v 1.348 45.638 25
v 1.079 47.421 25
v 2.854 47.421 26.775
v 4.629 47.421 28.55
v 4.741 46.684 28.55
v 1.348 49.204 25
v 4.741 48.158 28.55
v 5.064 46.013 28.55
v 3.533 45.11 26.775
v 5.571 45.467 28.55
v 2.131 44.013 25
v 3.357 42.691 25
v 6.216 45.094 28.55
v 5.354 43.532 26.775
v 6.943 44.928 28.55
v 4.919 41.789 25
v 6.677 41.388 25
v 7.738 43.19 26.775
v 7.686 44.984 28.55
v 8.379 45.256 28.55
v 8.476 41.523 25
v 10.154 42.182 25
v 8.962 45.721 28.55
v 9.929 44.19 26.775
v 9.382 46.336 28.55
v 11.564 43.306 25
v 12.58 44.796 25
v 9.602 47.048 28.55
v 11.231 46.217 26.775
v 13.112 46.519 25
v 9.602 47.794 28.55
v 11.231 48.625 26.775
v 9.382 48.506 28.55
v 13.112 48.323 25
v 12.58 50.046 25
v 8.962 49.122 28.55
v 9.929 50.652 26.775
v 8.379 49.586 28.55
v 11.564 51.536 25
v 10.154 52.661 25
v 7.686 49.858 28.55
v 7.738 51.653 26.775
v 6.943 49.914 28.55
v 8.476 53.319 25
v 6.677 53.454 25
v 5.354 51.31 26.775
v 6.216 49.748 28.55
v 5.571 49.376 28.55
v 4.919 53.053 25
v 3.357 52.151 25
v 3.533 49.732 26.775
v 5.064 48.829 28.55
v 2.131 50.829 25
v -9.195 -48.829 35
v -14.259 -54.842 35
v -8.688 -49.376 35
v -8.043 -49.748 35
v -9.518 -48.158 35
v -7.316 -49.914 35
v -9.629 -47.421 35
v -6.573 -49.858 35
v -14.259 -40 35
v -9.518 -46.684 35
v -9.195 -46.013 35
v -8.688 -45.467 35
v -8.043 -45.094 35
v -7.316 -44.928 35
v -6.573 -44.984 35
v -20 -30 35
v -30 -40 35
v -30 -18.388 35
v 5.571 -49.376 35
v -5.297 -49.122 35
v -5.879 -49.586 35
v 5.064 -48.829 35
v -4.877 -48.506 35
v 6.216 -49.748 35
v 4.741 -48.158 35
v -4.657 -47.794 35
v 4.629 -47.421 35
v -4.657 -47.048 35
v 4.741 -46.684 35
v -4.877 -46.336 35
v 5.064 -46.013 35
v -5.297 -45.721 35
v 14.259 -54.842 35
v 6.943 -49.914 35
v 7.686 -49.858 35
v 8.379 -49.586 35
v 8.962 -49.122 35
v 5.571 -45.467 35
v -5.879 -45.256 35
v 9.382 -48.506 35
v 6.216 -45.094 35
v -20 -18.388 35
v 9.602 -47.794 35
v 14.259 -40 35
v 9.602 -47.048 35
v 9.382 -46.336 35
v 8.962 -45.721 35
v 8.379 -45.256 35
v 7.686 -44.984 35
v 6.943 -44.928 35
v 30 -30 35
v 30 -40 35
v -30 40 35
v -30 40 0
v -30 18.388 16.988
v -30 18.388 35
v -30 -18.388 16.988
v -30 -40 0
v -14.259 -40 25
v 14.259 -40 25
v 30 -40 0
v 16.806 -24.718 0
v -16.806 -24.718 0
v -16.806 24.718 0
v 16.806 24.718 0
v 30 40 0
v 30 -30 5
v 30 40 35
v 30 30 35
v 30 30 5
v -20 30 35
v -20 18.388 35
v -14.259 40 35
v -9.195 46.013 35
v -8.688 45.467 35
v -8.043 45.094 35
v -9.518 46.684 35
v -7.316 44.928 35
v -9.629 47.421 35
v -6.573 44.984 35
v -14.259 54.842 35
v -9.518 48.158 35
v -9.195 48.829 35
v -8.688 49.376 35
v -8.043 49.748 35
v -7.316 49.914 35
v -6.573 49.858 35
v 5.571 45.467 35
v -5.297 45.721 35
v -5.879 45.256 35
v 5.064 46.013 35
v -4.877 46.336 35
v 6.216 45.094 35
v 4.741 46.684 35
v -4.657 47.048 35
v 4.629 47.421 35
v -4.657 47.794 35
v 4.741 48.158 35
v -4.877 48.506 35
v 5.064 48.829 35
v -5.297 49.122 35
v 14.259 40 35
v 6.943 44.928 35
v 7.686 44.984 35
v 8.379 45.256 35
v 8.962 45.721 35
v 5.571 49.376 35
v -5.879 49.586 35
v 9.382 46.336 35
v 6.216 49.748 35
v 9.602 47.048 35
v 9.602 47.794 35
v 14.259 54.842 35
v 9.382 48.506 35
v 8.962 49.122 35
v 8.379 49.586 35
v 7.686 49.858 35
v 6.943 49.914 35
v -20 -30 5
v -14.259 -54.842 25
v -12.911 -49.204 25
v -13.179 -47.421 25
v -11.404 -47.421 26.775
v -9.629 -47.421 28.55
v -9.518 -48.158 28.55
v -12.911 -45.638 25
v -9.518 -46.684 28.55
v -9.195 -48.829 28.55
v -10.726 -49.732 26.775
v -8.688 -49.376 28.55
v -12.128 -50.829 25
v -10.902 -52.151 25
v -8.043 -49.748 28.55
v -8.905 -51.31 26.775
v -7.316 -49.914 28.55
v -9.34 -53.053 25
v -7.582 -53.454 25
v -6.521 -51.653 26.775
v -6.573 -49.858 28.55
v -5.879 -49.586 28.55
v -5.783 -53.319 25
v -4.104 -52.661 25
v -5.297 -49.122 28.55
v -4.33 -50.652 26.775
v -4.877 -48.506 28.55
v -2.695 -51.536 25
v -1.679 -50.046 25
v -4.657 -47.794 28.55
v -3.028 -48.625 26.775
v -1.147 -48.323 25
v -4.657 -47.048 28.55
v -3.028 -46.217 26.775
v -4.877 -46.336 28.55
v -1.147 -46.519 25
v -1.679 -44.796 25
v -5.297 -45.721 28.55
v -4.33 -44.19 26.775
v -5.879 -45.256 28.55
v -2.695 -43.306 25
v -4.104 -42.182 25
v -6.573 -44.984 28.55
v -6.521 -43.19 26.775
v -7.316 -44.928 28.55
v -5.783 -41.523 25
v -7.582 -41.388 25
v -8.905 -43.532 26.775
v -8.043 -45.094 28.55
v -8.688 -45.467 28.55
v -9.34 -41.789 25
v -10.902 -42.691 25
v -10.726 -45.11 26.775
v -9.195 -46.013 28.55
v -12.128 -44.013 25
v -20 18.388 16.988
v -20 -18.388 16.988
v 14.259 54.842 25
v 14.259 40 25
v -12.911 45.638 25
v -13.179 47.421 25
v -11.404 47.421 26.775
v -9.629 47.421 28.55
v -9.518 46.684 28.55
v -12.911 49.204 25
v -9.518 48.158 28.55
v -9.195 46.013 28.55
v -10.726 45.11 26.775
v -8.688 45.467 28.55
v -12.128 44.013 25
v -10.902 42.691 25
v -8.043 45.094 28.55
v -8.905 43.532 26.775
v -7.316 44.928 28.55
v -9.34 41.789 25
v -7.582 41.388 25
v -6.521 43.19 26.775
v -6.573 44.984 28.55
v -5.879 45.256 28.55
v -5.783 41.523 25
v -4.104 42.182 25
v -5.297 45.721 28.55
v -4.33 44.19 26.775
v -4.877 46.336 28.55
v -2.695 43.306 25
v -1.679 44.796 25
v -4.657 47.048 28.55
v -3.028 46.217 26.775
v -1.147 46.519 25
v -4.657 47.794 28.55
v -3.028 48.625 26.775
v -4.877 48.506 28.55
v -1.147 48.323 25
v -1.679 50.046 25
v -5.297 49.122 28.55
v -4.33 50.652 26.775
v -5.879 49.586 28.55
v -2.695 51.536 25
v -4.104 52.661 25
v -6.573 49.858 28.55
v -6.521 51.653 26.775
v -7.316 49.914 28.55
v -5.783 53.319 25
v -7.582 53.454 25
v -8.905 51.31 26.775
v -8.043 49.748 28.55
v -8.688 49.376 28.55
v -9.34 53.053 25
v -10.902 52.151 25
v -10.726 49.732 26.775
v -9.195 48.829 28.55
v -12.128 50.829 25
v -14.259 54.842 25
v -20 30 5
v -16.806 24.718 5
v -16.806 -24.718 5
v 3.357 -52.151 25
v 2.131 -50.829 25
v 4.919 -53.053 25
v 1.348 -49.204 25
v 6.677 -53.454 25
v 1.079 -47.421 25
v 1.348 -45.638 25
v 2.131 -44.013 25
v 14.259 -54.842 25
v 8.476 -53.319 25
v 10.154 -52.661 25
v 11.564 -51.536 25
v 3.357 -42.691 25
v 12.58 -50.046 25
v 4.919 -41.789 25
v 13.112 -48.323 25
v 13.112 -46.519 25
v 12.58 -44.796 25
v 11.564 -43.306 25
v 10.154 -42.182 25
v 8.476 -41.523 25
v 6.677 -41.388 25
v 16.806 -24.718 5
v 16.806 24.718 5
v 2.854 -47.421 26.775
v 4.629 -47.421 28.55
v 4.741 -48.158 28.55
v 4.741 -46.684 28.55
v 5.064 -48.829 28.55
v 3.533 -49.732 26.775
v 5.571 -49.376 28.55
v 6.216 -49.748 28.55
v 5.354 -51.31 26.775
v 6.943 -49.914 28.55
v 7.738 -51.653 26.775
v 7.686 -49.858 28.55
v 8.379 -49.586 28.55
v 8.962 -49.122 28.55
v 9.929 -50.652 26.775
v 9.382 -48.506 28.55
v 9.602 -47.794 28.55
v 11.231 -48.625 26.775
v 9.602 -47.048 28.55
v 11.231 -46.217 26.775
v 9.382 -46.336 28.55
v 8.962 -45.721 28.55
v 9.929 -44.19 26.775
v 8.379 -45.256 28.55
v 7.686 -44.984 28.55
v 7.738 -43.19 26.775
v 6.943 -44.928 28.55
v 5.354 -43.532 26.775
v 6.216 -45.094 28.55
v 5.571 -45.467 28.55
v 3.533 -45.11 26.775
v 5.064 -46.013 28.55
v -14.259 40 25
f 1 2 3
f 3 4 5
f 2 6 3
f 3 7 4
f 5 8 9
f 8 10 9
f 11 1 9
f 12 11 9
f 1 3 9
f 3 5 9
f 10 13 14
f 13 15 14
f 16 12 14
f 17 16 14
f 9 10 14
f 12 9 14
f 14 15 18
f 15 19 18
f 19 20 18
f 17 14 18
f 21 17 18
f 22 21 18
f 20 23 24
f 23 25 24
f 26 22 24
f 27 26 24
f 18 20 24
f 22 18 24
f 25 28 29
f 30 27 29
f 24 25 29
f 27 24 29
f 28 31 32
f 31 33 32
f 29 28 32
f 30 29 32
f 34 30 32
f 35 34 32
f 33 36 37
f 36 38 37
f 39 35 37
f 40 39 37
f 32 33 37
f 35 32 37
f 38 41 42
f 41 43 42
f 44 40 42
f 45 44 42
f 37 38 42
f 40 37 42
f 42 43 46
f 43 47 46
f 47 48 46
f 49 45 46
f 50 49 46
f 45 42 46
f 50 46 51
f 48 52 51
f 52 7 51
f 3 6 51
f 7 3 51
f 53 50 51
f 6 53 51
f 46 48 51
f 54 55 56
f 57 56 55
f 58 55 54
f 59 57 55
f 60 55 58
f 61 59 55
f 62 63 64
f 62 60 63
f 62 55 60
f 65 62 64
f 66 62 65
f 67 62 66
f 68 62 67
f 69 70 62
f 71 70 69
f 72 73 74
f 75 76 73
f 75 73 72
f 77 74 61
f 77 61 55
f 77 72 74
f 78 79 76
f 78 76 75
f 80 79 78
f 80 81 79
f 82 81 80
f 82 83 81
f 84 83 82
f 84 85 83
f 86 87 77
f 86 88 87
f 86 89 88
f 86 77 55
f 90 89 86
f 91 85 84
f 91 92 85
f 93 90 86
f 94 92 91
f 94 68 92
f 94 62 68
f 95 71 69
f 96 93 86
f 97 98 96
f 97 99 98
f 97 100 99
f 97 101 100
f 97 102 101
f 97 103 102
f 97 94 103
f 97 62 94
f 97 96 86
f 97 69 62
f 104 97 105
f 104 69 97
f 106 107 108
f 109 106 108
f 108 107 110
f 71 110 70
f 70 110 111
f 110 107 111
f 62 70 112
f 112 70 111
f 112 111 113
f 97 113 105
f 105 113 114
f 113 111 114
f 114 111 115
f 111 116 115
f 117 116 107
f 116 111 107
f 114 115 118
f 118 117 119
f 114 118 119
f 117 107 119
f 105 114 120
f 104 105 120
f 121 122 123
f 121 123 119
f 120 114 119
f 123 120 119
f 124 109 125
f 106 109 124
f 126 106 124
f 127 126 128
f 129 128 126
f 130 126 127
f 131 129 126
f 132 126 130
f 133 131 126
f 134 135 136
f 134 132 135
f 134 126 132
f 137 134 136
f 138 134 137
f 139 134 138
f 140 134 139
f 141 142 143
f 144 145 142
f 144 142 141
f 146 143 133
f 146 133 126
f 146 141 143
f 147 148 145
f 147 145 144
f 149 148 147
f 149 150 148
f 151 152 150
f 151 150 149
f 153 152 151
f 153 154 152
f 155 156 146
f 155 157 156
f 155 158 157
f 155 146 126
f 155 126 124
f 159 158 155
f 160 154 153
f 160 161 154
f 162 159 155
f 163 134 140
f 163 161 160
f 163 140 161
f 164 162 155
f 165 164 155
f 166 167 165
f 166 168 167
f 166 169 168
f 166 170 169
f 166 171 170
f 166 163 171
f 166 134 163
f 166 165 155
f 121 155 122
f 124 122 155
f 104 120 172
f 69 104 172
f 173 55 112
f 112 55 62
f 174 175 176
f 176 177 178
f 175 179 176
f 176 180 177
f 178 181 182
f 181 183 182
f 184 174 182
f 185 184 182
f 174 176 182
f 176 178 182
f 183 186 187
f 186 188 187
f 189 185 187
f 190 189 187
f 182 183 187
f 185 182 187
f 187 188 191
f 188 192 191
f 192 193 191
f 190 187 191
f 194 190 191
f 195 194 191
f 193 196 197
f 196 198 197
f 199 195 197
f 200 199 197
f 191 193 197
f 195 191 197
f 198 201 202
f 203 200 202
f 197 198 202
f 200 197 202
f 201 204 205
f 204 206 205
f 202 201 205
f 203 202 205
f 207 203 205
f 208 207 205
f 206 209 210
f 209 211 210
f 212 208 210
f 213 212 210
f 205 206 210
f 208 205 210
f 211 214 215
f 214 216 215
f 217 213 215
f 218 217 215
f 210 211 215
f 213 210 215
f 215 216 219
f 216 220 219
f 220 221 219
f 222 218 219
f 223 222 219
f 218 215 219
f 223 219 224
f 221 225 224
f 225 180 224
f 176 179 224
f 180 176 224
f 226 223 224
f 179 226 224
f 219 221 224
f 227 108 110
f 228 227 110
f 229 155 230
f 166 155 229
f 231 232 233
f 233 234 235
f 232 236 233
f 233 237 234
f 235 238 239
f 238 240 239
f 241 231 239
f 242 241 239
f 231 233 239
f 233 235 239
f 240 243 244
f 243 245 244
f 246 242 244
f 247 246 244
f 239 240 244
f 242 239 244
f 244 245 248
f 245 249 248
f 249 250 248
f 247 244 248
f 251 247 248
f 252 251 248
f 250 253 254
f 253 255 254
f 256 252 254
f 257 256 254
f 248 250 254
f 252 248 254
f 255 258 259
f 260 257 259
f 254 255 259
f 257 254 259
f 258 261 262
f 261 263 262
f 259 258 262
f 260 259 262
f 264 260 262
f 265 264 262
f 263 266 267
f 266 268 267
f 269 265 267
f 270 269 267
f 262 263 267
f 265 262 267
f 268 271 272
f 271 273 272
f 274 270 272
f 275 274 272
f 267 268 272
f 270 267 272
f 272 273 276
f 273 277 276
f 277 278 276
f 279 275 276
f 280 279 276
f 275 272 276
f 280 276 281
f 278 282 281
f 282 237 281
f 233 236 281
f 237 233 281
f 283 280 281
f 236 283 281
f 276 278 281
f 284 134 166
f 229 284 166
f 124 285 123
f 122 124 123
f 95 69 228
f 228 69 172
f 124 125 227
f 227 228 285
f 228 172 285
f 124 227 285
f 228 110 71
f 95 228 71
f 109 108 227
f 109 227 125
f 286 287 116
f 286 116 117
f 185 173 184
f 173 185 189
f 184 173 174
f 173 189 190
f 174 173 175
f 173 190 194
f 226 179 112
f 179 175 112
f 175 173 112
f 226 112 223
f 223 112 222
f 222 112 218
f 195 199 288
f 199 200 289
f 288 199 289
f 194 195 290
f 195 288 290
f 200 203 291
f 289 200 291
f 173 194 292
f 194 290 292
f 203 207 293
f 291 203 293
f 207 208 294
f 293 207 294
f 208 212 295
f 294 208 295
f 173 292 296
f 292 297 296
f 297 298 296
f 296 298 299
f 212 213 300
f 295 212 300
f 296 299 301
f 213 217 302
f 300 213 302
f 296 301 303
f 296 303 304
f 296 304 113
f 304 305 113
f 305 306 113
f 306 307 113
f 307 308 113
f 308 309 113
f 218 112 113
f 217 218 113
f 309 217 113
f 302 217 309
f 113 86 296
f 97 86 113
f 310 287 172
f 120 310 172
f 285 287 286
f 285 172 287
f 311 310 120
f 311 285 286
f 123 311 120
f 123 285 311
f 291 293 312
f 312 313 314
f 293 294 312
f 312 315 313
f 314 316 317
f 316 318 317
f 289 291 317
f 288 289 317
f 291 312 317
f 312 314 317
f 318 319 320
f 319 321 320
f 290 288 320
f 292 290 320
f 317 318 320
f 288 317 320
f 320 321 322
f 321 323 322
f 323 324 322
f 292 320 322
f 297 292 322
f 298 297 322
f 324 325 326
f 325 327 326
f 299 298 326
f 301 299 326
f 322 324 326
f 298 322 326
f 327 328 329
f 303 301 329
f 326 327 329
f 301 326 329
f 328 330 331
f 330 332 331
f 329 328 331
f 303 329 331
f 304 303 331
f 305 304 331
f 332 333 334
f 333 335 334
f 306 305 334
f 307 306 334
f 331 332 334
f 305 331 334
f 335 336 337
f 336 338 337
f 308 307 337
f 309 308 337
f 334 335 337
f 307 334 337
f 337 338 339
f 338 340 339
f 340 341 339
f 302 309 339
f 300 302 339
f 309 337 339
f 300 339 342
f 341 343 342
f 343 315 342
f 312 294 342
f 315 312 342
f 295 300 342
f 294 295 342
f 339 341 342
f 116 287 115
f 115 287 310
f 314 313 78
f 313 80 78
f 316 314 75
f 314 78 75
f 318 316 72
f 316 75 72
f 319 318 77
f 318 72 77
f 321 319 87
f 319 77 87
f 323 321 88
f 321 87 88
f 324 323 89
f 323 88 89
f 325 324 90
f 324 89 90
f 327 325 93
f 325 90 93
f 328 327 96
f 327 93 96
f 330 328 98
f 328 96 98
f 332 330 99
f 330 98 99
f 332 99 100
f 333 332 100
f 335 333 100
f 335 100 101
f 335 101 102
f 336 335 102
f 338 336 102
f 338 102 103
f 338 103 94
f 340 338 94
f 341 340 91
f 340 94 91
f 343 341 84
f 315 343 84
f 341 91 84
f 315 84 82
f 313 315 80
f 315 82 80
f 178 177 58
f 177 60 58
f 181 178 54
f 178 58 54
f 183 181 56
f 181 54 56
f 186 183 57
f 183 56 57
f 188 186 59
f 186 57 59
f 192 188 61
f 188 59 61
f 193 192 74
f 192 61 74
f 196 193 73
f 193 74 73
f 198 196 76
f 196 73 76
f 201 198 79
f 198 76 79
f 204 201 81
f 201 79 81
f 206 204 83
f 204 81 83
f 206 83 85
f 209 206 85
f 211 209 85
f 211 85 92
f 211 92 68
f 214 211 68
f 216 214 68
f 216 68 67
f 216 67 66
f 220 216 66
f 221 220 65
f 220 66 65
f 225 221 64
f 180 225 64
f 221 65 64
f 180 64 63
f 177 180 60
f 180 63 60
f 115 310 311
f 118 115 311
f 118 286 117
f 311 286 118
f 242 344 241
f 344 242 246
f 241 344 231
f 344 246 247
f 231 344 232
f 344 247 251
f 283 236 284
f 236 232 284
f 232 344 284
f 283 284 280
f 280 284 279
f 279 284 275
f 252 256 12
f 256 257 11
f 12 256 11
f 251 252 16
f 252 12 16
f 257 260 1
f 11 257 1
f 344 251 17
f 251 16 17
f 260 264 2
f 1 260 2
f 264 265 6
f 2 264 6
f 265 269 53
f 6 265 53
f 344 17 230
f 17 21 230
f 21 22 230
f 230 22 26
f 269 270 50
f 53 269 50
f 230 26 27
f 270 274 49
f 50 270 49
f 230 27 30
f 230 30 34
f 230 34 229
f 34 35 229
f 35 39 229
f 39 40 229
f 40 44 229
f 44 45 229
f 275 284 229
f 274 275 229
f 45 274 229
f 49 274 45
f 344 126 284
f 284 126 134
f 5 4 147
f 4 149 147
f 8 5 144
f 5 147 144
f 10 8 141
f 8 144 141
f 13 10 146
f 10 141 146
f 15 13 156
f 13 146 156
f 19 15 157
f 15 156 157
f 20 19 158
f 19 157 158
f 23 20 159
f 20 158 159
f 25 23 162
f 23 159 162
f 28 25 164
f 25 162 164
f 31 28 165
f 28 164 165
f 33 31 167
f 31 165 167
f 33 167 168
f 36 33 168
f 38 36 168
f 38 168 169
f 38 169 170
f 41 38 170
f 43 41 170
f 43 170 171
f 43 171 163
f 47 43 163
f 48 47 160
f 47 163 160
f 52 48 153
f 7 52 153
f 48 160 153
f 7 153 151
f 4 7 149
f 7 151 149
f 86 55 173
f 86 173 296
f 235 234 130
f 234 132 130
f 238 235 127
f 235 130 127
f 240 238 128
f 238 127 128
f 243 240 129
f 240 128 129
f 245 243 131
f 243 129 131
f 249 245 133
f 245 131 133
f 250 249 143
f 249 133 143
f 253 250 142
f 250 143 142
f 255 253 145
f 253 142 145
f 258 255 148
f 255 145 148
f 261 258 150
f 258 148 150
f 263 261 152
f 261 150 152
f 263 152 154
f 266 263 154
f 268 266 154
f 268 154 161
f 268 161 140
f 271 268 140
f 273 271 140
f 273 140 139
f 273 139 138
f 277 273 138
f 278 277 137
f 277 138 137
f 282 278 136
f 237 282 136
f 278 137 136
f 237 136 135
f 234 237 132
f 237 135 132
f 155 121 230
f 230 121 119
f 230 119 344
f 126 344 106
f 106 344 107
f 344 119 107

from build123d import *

# Parameters (mm, degrees)
F1_DEPTH       = 35
F2_DEPTH       = 5
F3_W           = 33.611692
F3_H           = 49.436976
F4_DEPTH       = 25
F5_W           = 28.51793
F5_H           = 14.842174
F6_DEPTH       = 10
F9_D           = 5
F9_CSINK_D     = 12.1
F9_CSINK_ANGLE = 90
F10_W          = 36.775354
F10_H          = 36.023068
F11_DEPTH      = 25


with BuildPart() as f1:
    # F0 (on Top) → F1 (new body)
    with BuildSketch(Plane.XY):
        Polygon((-20, 30), (20, 30), (30, 30), (30, 40), (-30, 40), (-30, -40), (30, -40), (30, -30), (20, -30), (-20, -30), align=None)
    extrude(amount=F1_DEPTH)

    # F0 (on Top) → F2 (join)
    with BuildSketch(Plane.XY):
        Polygon((30, 30), (20, 30), (-20, 30), (-20, -30), (20, -30), (30, -30), align=None)
    extrude(amount=F2_DEPTH)

    # F3 (on face) → F4 (cut)
    with BuildSketch(Plane.XY.offset(5)):
        Rectangle(F3_W, F3_H)
    extrude(amount=-F4_DEPTH, mode=Mode.SUBTRACT)

    # F5 (on face) → F6 (join)
    with BuildSketch(Plane.XY.offset(35)):
        with Locations((0, -47.421087)):
            Rectangle(F5_W, F5_H)
        with Locations((0, 47.421087)):
            Rectangle(F5_W, F5_H)
    extrude(amount=-F6_DEPTH)

    # F9 (through all)
    with Locations(Plane(origin=(0, 0, 25), x_dir=(1, 0, 0), z_dir=(0, 0, -1))):
        with Locations((7.129482, 47.421087), (-7.129482, 47.421087), (-7.129482, -47.421087), (7.129482, -47.421087)):
            CounterSinkHole(F9_D / 2, F9_CSINK_D / 2, counter_sink_angle=F9_CSINK_ANGLE)

    # F10 (on face) → F11 (cut)
    with BuildSketch(Plane(origin=(-30, 0, 0), x_dir=(0, -1, 0), z_dir=(-1, 0, 0))):
        with Locations((0, 35)):
            Rectangle(F10_W, F10_H)
    extrude(amount=-F11_DEPTH, mode=Mode.SUBTRACT)


solid = f1.part
